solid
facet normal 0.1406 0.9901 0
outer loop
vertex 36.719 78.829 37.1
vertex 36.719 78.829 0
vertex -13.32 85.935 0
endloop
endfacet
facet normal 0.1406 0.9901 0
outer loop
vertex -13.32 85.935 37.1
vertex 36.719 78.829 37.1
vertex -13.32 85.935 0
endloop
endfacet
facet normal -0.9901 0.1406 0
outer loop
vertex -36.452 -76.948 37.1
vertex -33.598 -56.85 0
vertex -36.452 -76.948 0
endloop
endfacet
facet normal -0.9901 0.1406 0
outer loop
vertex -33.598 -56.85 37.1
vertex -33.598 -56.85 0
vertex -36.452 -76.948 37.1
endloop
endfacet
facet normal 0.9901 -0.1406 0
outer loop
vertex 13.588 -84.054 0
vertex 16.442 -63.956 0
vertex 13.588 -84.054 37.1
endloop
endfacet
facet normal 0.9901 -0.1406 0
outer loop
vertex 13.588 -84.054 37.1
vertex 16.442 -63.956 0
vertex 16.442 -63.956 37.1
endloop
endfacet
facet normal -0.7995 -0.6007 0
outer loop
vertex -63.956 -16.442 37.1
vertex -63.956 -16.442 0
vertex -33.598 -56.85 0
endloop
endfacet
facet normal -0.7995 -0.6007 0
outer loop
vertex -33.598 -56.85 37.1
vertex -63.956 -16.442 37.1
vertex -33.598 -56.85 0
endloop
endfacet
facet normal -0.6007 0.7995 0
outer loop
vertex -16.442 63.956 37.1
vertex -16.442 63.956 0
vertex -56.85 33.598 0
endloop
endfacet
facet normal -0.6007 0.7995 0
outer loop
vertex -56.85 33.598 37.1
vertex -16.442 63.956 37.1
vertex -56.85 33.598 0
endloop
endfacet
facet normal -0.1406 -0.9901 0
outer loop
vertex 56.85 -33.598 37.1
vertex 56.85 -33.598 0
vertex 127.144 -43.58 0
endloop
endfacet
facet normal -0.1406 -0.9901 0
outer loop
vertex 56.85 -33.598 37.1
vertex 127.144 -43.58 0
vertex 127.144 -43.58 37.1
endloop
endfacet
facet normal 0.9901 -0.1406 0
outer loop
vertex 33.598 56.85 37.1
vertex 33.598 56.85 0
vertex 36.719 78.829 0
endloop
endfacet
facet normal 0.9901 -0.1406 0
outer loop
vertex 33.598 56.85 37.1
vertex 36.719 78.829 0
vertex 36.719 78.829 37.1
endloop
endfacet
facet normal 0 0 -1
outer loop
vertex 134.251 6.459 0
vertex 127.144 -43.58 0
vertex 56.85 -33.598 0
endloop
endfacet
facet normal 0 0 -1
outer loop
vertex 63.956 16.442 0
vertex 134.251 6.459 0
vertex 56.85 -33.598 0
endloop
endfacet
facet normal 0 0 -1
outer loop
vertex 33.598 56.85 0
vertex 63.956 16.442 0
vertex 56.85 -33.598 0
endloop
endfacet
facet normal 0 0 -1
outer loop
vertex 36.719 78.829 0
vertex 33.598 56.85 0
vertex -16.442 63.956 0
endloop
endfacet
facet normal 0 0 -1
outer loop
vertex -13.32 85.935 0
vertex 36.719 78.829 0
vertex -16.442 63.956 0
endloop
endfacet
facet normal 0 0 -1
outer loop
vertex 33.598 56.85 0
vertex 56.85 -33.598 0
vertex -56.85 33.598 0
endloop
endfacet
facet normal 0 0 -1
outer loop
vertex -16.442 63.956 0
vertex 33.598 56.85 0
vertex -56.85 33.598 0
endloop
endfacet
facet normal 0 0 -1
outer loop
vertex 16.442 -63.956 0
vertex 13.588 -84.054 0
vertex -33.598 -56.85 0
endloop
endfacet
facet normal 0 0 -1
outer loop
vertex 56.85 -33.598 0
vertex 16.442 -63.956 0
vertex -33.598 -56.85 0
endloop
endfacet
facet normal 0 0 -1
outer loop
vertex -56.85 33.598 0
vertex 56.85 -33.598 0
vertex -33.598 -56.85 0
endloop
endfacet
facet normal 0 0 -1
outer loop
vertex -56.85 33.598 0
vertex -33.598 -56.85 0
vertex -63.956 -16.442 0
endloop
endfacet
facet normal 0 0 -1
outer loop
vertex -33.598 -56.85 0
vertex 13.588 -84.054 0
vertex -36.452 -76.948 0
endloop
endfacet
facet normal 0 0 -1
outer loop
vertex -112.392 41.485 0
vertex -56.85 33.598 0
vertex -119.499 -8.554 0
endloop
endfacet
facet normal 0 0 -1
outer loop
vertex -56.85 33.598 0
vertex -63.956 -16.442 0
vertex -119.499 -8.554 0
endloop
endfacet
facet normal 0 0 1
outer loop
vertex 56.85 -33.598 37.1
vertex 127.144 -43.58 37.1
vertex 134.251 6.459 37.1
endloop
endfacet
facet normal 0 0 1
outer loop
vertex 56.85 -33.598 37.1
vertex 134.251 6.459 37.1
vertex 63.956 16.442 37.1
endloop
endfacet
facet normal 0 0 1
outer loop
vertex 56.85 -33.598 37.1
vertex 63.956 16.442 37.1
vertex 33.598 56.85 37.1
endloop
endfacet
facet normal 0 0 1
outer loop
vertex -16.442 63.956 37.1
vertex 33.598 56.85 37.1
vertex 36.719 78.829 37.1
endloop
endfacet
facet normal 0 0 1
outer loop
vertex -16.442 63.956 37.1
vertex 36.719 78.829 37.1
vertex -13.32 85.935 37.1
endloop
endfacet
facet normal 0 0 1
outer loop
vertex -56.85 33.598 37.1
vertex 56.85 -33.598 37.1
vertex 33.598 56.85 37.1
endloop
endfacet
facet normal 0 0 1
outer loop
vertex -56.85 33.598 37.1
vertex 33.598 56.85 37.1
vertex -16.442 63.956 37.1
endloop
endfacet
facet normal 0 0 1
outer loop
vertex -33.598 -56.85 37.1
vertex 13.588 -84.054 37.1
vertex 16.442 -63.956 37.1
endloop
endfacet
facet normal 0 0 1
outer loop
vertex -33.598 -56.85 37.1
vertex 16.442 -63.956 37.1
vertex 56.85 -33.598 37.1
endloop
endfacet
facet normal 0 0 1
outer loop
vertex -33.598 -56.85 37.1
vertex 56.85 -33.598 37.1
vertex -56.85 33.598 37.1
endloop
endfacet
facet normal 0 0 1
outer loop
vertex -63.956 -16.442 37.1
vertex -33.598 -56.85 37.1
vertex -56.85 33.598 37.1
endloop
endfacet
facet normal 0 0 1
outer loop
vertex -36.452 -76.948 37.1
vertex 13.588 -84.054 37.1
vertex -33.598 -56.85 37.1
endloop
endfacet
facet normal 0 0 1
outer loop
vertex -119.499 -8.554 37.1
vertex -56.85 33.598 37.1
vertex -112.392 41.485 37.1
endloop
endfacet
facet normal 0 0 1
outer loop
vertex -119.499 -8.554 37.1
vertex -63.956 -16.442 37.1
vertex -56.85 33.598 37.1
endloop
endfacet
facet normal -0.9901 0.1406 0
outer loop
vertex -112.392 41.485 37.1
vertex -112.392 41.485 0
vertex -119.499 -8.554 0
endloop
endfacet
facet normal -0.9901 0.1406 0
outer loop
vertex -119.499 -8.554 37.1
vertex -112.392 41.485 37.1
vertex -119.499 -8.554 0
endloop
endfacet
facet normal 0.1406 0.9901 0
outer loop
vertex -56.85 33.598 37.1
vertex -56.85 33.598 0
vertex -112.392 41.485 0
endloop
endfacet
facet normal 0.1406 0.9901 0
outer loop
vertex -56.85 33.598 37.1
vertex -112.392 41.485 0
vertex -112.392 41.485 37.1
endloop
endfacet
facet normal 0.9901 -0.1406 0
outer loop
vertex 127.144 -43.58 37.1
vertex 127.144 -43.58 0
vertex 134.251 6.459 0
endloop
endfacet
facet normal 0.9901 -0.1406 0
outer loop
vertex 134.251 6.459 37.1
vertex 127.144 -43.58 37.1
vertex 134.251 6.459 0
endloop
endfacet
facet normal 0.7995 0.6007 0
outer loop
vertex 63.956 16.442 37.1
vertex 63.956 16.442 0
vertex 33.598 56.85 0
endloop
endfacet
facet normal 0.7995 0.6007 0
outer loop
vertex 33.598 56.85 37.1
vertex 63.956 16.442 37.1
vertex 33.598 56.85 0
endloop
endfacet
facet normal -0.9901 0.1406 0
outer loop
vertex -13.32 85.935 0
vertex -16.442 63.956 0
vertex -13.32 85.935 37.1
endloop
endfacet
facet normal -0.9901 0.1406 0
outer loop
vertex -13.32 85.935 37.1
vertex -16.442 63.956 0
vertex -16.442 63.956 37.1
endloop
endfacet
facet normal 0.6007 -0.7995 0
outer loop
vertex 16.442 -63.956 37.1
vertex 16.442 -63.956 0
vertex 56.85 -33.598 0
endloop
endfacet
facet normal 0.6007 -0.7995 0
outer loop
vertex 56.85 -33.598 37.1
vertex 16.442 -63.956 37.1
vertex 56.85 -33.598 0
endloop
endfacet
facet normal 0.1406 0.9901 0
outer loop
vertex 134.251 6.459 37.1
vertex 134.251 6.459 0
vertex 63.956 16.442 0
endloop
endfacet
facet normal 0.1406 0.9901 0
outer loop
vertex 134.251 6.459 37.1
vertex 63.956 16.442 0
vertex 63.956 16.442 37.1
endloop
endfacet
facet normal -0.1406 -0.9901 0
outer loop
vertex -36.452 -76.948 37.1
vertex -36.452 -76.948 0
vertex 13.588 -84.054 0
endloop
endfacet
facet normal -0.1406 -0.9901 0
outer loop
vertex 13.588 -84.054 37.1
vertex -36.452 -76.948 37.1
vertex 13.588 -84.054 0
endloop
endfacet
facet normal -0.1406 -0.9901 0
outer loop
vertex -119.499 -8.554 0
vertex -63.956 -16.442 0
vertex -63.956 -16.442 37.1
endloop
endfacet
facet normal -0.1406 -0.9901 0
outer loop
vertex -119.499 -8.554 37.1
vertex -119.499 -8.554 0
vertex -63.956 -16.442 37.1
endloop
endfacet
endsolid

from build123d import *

# Parameters (mm, degrees)
F1_DEPTH = 37.1
F2_DEPTH = 56.1
F3_DEPTH = 71
F4_DEPTH = 20.3
F5_DEPTH = 22.2


with BuildPart() as f1:
    # F0 (on Top) → F1 (new body)
    with BuildSketch(Plane.XY):
        Polygon((-56.8497114772, 33.5975717617), (-63.9558873182, -16.4417456699), (-33.5975717617, -56.8497114772), (16.4417456699, -63.9558873182), (56.8497114772, -33.5975717617), (63.9558873182, 16.4417456699), (33.5975717617, 56.8497114772), (-16.4417456699, 63.9558873182), align=None)
    extrude(amount=F1_DEPTH)

    # F2 (add): a face of the model
    f2_faces = [f1.faces().sort_by_distance(p)[0] for p in [
        (-60.4027993977, 8.5779130459, 18.55),
    ]]
    extrude(f2_faces, amount=F2_DEPTH)

    # F3 (add): a face of the model
    f3_faces = [f1.faces().sort_by_distance(p)[0] for p in [
        (60.4027993977, -8.5779130459, 18.55),
    ]]
    extrude(f3_faces, amount=F3_DEPTH)

    # F4 (add): a face of the model
    f4_faces = [f1.faces().sort_by_distance(p)[0] for p in [
        (-8.5779130459, -60.4027993977, 18.55),
    ]]
    extrude(f4_faces, amount=F4_DEPTH)

    # F5 (add): a face of the model
    f5_faces = [f1.faces().sort_by_distance(p)[0] for p in [
        (8.5779130459, 60.4027993977, 18.55),
    ]]
    extrude(f5_faces, amount=F5_DEPTH)


solid = f1.part
